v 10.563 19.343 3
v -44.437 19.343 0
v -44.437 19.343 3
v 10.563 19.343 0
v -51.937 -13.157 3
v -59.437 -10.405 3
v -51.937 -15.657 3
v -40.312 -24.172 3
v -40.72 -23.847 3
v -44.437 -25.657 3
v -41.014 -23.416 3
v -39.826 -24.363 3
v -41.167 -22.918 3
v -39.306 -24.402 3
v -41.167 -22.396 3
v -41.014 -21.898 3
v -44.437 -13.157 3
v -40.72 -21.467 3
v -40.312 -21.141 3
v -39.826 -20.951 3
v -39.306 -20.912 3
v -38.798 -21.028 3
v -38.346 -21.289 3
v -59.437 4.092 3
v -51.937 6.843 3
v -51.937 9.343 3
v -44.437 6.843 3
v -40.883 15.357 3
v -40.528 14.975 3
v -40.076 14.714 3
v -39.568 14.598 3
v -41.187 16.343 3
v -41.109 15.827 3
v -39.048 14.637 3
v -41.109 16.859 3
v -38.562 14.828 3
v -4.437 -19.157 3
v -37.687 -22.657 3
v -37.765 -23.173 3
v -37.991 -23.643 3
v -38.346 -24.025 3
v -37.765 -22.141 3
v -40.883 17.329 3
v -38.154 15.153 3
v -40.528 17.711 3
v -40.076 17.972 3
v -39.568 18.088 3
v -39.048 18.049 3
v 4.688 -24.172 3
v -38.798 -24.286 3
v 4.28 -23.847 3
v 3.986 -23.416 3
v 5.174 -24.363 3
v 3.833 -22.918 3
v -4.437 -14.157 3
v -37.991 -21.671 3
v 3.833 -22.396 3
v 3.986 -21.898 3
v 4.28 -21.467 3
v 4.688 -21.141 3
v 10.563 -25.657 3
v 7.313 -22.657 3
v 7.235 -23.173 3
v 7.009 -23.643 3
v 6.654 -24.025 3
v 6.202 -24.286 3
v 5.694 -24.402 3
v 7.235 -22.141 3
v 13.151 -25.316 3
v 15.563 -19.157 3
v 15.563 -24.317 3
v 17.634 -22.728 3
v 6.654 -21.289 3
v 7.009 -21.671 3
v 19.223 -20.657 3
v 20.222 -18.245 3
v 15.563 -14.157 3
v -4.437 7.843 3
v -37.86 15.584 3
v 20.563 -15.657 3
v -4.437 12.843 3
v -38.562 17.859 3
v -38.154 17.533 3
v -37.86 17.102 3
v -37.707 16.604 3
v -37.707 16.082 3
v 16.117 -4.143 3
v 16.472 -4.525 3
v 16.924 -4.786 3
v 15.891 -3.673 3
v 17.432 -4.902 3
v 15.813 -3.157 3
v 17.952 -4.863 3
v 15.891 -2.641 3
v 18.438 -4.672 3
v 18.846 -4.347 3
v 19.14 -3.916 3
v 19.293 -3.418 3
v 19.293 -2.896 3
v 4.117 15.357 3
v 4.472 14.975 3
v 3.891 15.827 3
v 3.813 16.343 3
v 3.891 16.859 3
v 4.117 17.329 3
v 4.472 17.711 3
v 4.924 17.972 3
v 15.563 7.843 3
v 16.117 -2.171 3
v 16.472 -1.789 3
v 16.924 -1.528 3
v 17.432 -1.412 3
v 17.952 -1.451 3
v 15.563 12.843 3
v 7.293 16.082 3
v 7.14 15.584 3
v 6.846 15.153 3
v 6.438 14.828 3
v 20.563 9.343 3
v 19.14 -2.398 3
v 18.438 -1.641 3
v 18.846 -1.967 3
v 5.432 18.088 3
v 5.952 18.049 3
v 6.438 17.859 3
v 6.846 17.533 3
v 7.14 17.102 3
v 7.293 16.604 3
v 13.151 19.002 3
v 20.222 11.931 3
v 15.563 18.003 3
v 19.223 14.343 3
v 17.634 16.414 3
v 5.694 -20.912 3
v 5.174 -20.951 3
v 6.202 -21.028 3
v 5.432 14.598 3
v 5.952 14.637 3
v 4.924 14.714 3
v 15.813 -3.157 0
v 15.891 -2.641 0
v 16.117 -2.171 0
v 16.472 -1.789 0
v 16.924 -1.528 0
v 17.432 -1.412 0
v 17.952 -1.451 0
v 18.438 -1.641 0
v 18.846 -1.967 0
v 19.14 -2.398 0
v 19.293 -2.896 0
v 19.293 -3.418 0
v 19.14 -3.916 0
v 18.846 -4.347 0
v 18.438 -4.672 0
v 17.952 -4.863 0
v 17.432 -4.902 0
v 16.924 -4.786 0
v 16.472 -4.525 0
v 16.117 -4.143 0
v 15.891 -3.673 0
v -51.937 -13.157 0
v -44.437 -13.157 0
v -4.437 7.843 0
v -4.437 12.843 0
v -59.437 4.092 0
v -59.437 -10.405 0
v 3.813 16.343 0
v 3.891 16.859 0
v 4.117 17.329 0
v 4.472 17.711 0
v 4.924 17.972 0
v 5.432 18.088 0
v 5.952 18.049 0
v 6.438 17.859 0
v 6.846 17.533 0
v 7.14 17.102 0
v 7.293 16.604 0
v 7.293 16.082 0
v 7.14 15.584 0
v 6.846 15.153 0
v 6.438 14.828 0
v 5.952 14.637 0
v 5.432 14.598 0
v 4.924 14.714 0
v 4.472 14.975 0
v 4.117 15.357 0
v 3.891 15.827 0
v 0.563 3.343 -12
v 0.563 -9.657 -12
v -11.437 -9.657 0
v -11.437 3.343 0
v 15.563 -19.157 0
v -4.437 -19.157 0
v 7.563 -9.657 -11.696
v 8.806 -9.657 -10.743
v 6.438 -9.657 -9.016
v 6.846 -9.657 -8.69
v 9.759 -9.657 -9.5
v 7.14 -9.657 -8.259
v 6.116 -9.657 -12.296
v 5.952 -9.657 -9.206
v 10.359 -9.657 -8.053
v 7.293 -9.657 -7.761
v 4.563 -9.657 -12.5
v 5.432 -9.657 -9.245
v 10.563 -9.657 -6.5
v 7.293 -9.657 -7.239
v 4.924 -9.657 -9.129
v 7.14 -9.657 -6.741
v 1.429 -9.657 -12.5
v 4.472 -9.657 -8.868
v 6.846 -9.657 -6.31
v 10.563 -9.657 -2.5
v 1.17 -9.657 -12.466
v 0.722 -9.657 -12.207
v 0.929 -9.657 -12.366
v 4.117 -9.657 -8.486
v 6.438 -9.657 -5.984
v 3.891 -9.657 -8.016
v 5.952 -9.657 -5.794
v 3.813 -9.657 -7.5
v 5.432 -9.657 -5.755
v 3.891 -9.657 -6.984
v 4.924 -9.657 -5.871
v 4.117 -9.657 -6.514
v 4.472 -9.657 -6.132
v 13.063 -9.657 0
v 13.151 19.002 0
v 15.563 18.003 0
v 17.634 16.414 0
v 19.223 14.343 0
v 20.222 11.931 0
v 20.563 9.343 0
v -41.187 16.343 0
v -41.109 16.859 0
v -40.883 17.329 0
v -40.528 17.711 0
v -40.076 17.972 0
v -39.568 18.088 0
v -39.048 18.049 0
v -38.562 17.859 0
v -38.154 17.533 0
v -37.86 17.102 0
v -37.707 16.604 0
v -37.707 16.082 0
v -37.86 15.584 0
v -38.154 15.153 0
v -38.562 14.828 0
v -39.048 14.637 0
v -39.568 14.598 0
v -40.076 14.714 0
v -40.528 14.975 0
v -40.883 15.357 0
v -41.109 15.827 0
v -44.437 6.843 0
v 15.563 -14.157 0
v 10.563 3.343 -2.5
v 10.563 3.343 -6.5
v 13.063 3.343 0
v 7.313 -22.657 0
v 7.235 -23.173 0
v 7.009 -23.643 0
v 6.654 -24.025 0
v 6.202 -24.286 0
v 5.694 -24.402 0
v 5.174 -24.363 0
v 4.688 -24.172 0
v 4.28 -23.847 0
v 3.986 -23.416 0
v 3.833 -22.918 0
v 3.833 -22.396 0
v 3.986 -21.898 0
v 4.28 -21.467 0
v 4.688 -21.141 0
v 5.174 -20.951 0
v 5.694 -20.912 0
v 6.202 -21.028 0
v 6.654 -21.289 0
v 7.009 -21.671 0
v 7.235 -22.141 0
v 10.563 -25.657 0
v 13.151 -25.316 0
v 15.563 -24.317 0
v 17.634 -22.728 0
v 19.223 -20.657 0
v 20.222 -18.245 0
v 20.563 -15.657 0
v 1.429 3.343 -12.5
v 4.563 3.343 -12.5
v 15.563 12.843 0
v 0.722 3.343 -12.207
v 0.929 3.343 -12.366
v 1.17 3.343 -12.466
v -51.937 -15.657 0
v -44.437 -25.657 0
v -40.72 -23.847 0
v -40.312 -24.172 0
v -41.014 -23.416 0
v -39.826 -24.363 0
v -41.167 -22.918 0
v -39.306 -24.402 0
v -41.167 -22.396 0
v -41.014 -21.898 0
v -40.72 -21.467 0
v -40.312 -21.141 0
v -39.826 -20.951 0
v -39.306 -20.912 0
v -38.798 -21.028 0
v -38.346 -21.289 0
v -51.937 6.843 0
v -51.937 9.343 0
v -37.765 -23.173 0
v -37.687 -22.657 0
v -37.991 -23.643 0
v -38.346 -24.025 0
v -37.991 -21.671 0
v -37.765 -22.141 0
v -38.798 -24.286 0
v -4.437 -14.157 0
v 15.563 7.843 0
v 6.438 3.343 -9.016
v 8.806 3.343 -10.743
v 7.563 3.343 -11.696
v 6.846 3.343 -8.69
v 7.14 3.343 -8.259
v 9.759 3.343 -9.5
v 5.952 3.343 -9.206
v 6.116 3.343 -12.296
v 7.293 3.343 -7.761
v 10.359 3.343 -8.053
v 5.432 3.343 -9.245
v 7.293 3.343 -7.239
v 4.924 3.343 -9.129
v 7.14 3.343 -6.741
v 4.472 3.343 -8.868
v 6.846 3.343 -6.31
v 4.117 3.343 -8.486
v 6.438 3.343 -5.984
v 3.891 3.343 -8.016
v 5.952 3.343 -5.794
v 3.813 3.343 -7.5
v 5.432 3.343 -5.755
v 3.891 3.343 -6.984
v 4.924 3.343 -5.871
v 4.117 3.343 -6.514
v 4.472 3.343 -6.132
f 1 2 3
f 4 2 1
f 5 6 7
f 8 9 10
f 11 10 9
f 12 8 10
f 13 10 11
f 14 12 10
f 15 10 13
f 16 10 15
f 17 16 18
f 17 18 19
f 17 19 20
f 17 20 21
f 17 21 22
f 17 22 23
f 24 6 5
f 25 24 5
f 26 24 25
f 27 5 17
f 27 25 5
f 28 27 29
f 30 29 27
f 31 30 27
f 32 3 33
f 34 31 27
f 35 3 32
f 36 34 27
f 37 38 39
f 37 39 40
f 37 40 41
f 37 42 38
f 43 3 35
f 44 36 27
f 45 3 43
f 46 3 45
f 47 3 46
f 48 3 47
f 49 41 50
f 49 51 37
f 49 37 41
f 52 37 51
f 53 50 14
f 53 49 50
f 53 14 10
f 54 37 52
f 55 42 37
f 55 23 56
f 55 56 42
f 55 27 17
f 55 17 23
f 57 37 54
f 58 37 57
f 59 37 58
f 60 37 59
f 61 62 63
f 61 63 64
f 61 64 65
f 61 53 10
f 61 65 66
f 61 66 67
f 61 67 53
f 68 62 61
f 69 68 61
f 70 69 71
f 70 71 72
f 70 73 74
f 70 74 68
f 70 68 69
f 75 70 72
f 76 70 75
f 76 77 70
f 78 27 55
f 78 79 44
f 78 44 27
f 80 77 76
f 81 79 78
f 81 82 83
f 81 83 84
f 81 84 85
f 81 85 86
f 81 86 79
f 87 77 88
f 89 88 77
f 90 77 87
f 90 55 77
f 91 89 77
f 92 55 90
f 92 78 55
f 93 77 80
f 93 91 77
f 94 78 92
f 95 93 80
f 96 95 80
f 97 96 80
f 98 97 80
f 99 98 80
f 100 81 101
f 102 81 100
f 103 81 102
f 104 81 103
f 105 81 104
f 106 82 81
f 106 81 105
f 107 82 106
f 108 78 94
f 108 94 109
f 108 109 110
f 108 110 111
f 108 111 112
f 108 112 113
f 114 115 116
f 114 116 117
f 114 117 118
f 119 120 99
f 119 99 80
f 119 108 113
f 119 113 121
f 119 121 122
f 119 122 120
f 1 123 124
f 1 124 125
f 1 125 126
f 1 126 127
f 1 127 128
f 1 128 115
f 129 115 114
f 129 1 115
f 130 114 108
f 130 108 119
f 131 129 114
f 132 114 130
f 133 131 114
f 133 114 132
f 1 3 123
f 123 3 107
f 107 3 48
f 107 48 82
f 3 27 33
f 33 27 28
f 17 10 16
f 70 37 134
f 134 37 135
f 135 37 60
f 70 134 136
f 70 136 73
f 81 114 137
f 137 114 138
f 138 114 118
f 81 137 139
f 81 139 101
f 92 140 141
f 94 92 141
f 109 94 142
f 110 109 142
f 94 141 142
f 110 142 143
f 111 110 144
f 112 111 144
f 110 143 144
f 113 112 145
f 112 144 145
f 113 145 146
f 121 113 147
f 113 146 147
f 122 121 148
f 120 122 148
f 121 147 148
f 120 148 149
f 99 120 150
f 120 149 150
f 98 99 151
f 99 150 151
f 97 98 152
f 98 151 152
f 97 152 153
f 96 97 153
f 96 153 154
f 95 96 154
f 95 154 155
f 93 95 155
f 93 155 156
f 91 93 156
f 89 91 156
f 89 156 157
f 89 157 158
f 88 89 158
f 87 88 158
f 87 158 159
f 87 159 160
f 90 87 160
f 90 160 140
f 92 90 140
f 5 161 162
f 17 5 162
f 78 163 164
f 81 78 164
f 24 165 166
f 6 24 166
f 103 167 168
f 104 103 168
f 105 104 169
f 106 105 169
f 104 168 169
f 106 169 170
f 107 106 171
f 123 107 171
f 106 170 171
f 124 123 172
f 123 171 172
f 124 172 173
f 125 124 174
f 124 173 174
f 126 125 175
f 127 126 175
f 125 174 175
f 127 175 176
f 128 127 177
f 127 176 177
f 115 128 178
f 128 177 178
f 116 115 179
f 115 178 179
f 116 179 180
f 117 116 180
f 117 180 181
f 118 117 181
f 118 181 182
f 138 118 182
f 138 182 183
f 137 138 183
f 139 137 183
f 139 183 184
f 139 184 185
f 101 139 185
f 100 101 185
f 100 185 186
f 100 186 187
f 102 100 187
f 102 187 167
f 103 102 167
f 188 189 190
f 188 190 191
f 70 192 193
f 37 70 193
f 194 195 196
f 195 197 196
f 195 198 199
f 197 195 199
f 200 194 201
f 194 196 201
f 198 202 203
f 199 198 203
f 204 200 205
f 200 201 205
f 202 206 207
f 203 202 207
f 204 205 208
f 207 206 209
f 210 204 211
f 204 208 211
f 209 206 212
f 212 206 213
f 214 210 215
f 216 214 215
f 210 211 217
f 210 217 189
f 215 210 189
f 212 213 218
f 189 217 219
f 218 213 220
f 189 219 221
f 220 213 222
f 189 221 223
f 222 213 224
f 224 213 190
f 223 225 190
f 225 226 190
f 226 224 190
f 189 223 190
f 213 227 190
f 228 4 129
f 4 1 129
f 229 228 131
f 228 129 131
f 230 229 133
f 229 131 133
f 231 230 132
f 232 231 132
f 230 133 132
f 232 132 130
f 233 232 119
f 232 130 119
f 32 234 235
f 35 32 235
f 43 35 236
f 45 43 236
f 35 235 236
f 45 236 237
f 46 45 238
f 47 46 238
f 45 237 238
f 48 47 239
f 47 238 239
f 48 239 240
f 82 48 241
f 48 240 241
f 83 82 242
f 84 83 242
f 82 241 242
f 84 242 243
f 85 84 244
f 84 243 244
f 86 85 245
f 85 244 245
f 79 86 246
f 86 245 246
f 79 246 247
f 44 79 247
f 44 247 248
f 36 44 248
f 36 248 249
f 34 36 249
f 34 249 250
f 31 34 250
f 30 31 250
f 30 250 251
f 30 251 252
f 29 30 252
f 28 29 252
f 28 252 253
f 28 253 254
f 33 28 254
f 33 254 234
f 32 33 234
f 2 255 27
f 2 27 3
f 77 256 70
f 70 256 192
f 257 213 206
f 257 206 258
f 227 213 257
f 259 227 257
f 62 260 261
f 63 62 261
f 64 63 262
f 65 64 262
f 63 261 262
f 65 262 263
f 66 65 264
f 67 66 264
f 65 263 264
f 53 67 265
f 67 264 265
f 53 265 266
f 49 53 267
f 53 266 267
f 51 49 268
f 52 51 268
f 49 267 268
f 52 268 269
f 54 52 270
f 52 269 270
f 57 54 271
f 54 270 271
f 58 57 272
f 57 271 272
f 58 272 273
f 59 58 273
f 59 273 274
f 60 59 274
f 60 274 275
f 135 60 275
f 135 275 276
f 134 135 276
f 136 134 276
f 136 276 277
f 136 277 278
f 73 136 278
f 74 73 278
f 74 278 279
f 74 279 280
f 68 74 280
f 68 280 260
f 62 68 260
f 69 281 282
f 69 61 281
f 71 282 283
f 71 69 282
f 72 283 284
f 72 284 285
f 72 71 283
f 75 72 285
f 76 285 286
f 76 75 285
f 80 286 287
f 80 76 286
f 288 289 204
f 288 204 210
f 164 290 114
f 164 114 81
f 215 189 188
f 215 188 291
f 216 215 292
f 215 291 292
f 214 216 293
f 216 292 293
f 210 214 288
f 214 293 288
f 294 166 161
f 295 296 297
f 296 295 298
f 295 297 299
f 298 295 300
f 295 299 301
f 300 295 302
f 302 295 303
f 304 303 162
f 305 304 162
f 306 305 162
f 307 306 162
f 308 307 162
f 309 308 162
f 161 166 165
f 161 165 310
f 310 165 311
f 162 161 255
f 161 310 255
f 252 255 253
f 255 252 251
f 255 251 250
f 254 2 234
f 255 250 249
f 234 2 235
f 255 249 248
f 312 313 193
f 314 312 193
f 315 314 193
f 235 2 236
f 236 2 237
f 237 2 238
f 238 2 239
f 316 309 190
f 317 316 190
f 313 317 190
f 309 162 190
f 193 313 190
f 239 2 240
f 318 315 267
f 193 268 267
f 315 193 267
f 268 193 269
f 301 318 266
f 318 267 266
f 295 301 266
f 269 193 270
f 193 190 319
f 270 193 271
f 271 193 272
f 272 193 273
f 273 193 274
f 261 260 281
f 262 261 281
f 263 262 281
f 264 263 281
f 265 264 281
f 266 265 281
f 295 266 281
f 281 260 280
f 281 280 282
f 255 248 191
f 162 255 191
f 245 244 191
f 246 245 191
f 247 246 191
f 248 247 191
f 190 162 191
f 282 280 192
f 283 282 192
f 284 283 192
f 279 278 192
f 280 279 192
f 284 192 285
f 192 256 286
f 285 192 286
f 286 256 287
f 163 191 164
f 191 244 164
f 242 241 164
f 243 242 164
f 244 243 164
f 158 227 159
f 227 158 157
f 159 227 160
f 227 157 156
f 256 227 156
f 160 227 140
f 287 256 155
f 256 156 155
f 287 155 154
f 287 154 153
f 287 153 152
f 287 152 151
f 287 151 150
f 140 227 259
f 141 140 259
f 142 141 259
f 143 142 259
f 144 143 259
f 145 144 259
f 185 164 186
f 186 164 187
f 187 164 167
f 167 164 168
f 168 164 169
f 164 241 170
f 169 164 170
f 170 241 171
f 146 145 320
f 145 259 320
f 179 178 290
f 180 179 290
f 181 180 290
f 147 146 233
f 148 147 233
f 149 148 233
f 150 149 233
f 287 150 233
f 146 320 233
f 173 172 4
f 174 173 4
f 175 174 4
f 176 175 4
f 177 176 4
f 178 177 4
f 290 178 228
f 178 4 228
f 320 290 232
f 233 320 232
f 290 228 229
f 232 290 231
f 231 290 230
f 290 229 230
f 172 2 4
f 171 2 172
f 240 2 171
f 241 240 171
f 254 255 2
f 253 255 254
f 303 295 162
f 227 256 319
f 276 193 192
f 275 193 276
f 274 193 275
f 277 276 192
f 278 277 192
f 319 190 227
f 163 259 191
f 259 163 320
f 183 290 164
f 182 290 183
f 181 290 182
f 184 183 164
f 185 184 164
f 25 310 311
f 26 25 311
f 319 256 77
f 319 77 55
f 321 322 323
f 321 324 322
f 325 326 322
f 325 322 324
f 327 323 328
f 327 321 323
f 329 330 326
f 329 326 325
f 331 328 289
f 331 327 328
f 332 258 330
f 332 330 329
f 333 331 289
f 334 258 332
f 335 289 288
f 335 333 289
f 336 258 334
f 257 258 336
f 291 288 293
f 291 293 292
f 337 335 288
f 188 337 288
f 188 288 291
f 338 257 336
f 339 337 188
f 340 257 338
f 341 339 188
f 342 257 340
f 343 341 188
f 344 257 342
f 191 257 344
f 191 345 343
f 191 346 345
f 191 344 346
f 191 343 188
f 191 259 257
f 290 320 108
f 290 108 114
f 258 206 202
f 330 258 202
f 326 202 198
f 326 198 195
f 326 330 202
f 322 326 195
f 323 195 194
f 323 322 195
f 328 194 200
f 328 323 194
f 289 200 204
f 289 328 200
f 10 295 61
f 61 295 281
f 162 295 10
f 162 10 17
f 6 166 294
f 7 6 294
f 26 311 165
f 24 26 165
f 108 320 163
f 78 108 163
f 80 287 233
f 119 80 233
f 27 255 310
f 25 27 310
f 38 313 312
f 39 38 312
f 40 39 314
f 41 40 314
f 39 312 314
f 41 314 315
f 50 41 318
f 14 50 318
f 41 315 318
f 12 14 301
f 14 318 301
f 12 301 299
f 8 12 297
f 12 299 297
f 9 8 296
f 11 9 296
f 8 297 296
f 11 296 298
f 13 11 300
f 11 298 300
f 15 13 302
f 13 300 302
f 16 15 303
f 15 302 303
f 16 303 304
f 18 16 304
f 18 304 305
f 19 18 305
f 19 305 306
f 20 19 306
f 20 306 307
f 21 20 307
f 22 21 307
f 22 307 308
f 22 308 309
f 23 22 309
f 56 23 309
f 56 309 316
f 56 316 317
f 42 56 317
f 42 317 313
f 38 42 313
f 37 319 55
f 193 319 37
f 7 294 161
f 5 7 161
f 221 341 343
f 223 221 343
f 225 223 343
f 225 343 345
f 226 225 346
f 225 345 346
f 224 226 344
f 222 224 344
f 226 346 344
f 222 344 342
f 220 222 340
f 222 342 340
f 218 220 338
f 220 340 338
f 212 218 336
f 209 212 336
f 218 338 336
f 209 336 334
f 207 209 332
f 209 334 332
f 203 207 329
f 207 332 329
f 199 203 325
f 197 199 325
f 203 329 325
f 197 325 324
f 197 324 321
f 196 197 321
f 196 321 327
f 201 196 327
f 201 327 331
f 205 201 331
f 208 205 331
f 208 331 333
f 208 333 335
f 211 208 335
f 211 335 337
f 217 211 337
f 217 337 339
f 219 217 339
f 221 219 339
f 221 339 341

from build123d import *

# Parameters (mm, degrees)
SKETCH1_W           = 65
SKETCH1_H           = 45
BOSS_EXTRUDE1_DEPTH = 3
SKETCH2_W           = 10
SKETCH2_H           = 13
BOSS_EXTRUDE2_DEPTH = 12.5
SKETCH3_R           = 1.75
CUT_EXTRUDE1_DEPTH  = 13.5
FILLET1_R           = 6
CHAMFER1_SIZE       = 12
FILLET3_R           = 1
SKETCH4_W           = 20
SKETCH4_H           = 5
CUT_EXTRUDE3_DEPTH  = 5
FILLET4_R           = 10
CHAMFER2_SIZE       = 2.5
SKETCH7_R           = 1.75
CUT_EXTRUDE4_DEPTH  = 5
BOSS_EXTRUDE4_DEPTH = 3


with BuildPart() as part:
    # Sketch1 → Boss-Extrude1 (new body)
    with BuildSketch(Plane.XY):
        with Locations((-11.936997319, -3.156836461)):
            Rectangle(SKETCH1_W, SKETCH1_H)
    extrude(amount=BOSS_EXTRUDE1_DEPTH)

    # Sketch2 → Boss-Extrude2 (add)
    with BuildSketch(Plane(origin=(0, 0, 0), x_dir=(-1, 0, 0), z_dir=(0, 0, -1))):
        with Locations((-5.563002681, -3.156836461)):
            Rectangle(SKETCH2_W, SKETCH2_H)
    extrude(amount=BOSS_EXTRUDE2_DEPTH)

    # Sketch3 → Cut-Extrude1 (cut)
    with BuildSketch(Plane(origin=(0, 3.343163539, 0), x_dir=(1, 0, 0), z_dir=(0, 1, 0))):
        with Locations(Location((5.563002681, 7.5, 0), (0, 0, 180))):
            Circle(SKETCH3_R)
    extrude(amount=-CUT_EXTRUDE1_DEPTH, mode=Mode.SUBTRACT)

    # Fillet1
    fillet1_edges = [part.edges().sort_by_distance(p)[0] for p in [
        (10.563002681, -3.156836461, -12.5),
    ]]
    fillet(fillet1_edges, radius=FILLET1_R)

    # Chamfer1
    chamfer1_edges = [part.edges().sort_by_distance(p)[0] for p in [
        (0.563002681, -3.156836461, 0),
    ]]
    chamfer(chamfer1_edges, length=CHAMFER1_SIZE)

    # Fillet3
    # the kernel refuses this fillet: 1 mm, written as the material it takes off along each edge
    with BuildSketch(Plane(origin=(0.563002681, 5.508227048, -12.5), x_dir=(1, 0, 0), z_dir=(0, -1, 0))) as fillet3_piece_1:
        with BuildLine():
            CenterArc((0.866025404, 1), FILLET3_R, 210, 60)
            Line((0, 0.5), (-0.017320508, 0.49))
            ThreePointArc((-0.017320508, 0.49), (-0.02, 0.25), (-0.02, 0))
            Line((-0.02, 0), (0, -0.02))
            Line((0, -0.02), (0.866025404, -0.02))
            Line((0.866025404, -0.02), (0.866025404, 0))
        make_face()
    extrude(amount=17.330127019, mode=Mode.SUBTRACT)

    # Sketch4 → Cut-Extrude3 (cut)
    with BuildSketch(Plane(origin=(0, 0, 0), x_dir=(-1, 0, 0), z_dir=(0, 0, -1))):
        with Locations((-5.563002681, 10.343163539)):
            Rectangle(SKETCH4_W, SKETCH4_H)
    cut_extrude3 = extrude(amount=-CUT_EXTRUDE3_DEPTH, mode=Mode.SUBTRACT)

    # Mirror2: Cut-Extrude3 across plane
    add(cut_extrude3.mirror(Plane.ZX.offset(-3.156836461)), mode=Mode.SUBTRACT)

    # Fillet4
    fillet4_edges = [part.edges().sort_by_distance(p)[0] for p in [
        (20.563002681, 19.343163539, 1.5),
        (20.563002681, -25.656836461, 1.5),
    ]]
    fillet(fillet4_edges, radius=FILLET4_R)

    # Chamfer2
    chamfer2_edges = [part.edges().sort_by_distance(p)[0] for p in [
        (10.563002681, -3.156836461, 0),
    ]]
    chamfer(chamfer2_edges, length=CHAMFER2_SIZE)

    # Sketch7 → Cut-Extrude4 (cut)
    with BuildSketch(Plane(origin=(0, 0, 0), x_dir=(-1, 0, 0), z_dir=(0, 0, -1))):
        with Locations((-17.563002681, -3.156836461)):
            Circle(SKETCH7_R)
        with Locations((-5.563002681, 16.343163539)):
            Circle(SKETCH7_R)
        with Locations((39.436997319, 16.343163539)):
            Circle(SKETCH7_R)
        with Locations(Location((39.436997319, -22.656836461, 0), (0, 0, 180))):
            Circle(SKETCH7_R)
        with Locations(Location((-5.563002681, -22.656836461, 0), (0, 0, 180))):
            Circle(SKETCH7_R)
    extrude(amount=-CUT_EXTRUDE4_DEPTH, mode=Mode.SUBTRACT)

    # Sketch8 → Boss-Extrude4 (add)
    with BuildSketch(Plane(origin=(0, 0, 0), x_dir=(-1, 0, 0), z_dir=(0, 0, -1))):
        Polygon((44.436997319, 6.843163539), (51.936997319, 6.843163539), (51.936997319, 9.343163539), (59.436997319, 4.091607002), (59.436997319, -10.405279925), (51.936997319, -15.656836461), (51.936997319, -13.156836461), (44.436997319, -13.156836461), align=None)
    extrude(amount=-BOSS_EXTRUDE4_DEPTH)


solid = part.part
